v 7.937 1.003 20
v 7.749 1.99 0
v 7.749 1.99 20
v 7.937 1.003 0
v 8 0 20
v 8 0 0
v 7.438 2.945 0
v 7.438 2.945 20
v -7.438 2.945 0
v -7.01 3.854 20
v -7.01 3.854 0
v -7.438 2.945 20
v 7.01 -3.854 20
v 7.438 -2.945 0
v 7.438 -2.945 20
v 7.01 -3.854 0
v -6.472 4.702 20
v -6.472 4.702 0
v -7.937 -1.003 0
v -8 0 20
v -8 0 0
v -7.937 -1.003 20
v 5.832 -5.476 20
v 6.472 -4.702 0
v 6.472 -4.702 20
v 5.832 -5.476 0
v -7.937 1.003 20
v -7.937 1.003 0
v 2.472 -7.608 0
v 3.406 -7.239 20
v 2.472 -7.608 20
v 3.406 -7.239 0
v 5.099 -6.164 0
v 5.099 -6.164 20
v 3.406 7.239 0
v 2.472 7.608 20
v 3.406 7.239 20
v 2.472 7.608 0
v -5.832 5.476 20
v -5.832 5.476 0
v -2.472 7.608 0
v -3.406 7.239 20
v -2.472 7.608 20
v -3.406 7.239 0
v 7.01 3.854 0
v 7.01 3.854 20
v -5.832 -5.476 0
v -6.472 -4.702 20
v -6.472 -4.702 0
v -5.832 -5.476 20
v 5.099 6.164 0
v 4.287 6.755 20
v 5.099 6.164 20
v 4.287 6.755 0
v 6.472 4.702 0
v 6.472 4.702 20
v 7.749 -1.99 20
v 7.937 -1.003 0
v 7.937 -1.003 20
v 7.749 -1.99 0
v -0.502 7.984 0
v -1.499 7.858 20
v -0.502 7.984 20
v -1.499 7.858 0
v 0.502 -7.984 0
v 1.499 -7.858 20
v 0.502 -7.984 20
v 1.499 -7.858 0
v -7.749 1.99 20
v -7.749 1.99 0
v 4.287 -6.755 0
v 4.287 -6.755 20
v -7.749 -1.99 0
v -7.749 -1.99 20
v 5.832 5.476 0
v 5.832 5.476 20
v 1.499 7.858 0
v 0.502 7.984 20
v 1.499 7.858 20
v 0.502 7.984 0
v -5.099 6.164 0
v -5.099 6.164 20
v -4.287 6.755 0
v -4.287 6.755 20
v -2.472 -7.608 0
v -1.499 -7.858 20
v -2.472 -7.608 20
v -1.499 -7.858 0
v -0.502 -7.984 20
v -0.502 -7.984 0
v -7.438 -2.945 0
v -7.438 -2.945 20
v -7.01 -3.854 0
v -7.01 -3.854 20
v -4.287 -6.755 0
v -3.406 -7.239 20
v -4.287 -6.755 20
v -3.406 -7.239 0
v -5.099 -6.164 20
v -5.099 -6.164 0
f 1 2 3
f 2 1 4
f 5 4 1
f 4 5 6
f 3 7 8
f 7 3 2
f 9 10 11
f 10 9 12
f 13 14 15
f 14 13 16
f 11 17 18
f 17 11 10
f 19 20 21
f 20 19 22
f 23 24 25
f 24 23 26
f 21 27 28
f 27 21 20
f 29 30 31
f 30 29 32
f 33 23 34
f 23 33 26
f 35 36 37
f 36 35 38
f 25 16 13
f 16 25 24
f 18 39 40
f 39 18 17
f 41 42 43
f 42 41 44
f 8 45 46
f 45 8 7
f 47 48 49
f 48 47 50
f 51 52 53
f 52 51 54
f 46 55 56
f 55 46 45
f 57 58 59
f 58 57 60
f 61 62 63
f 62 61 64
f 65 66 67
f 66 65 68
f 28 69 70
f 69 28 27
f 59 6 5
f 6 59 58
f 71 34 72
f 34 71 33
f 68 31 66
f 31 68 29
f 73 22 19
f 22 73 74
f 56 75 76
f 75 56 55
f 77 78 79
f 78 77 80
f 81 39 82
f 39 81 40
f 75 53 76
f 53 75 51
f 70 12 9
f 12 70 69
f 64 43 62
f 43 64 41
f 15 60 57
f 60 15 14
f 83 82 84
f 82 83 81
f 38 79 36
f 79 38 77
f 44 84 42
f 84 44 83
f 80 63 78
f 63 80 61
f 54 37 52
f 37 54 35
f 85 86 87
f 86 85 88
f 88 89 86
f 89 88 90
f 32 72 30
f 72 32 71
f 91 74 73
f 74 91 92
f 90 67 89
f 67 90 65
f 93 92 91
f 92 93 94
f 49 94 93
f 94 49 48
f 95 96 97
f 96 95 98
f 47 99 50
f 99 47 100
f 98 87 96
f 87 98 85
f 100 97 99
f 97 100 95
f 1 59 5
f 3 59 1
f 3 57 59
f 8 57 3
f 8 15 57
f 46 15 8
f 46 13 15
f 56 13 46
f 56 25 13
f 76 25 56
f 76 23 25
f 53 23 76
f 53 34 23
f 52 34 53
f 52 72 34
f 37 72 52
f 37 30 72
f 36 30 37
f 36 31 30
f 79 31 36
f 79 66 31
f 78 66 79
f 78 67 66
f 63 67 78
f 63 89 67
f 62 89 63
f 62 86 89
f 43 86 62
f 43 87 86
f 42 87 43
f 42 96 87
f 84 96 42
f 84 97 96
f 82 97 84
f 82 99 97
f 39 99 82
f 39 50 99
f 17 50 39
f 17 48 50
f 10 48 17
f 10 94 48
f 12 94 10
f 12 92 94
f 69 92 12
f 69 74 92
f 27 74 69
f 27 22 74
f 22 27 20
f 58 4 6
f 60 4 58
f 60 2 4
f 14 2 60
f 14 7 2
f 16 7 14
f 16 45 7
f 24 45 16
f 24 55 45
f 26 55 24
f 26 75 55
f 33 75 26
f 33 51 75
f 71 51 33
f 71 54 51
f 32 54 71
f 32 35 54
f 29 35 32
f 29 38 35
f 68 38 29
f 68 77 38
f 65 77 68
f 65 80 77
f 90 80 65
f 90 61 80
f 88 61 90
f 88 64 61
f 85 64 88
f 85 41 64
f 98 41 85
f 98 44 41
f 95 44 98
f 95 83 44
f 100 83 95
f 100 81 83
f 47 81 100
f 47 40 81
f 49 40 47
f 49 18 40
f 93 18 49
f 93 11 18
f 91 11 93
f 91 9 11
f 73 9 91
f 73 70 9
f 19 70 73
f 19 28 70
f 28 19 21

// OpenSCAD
$fn = 50;

difference() {
	union() {
		cylinder(h = 20, r = 8);
	}
	union();
}
